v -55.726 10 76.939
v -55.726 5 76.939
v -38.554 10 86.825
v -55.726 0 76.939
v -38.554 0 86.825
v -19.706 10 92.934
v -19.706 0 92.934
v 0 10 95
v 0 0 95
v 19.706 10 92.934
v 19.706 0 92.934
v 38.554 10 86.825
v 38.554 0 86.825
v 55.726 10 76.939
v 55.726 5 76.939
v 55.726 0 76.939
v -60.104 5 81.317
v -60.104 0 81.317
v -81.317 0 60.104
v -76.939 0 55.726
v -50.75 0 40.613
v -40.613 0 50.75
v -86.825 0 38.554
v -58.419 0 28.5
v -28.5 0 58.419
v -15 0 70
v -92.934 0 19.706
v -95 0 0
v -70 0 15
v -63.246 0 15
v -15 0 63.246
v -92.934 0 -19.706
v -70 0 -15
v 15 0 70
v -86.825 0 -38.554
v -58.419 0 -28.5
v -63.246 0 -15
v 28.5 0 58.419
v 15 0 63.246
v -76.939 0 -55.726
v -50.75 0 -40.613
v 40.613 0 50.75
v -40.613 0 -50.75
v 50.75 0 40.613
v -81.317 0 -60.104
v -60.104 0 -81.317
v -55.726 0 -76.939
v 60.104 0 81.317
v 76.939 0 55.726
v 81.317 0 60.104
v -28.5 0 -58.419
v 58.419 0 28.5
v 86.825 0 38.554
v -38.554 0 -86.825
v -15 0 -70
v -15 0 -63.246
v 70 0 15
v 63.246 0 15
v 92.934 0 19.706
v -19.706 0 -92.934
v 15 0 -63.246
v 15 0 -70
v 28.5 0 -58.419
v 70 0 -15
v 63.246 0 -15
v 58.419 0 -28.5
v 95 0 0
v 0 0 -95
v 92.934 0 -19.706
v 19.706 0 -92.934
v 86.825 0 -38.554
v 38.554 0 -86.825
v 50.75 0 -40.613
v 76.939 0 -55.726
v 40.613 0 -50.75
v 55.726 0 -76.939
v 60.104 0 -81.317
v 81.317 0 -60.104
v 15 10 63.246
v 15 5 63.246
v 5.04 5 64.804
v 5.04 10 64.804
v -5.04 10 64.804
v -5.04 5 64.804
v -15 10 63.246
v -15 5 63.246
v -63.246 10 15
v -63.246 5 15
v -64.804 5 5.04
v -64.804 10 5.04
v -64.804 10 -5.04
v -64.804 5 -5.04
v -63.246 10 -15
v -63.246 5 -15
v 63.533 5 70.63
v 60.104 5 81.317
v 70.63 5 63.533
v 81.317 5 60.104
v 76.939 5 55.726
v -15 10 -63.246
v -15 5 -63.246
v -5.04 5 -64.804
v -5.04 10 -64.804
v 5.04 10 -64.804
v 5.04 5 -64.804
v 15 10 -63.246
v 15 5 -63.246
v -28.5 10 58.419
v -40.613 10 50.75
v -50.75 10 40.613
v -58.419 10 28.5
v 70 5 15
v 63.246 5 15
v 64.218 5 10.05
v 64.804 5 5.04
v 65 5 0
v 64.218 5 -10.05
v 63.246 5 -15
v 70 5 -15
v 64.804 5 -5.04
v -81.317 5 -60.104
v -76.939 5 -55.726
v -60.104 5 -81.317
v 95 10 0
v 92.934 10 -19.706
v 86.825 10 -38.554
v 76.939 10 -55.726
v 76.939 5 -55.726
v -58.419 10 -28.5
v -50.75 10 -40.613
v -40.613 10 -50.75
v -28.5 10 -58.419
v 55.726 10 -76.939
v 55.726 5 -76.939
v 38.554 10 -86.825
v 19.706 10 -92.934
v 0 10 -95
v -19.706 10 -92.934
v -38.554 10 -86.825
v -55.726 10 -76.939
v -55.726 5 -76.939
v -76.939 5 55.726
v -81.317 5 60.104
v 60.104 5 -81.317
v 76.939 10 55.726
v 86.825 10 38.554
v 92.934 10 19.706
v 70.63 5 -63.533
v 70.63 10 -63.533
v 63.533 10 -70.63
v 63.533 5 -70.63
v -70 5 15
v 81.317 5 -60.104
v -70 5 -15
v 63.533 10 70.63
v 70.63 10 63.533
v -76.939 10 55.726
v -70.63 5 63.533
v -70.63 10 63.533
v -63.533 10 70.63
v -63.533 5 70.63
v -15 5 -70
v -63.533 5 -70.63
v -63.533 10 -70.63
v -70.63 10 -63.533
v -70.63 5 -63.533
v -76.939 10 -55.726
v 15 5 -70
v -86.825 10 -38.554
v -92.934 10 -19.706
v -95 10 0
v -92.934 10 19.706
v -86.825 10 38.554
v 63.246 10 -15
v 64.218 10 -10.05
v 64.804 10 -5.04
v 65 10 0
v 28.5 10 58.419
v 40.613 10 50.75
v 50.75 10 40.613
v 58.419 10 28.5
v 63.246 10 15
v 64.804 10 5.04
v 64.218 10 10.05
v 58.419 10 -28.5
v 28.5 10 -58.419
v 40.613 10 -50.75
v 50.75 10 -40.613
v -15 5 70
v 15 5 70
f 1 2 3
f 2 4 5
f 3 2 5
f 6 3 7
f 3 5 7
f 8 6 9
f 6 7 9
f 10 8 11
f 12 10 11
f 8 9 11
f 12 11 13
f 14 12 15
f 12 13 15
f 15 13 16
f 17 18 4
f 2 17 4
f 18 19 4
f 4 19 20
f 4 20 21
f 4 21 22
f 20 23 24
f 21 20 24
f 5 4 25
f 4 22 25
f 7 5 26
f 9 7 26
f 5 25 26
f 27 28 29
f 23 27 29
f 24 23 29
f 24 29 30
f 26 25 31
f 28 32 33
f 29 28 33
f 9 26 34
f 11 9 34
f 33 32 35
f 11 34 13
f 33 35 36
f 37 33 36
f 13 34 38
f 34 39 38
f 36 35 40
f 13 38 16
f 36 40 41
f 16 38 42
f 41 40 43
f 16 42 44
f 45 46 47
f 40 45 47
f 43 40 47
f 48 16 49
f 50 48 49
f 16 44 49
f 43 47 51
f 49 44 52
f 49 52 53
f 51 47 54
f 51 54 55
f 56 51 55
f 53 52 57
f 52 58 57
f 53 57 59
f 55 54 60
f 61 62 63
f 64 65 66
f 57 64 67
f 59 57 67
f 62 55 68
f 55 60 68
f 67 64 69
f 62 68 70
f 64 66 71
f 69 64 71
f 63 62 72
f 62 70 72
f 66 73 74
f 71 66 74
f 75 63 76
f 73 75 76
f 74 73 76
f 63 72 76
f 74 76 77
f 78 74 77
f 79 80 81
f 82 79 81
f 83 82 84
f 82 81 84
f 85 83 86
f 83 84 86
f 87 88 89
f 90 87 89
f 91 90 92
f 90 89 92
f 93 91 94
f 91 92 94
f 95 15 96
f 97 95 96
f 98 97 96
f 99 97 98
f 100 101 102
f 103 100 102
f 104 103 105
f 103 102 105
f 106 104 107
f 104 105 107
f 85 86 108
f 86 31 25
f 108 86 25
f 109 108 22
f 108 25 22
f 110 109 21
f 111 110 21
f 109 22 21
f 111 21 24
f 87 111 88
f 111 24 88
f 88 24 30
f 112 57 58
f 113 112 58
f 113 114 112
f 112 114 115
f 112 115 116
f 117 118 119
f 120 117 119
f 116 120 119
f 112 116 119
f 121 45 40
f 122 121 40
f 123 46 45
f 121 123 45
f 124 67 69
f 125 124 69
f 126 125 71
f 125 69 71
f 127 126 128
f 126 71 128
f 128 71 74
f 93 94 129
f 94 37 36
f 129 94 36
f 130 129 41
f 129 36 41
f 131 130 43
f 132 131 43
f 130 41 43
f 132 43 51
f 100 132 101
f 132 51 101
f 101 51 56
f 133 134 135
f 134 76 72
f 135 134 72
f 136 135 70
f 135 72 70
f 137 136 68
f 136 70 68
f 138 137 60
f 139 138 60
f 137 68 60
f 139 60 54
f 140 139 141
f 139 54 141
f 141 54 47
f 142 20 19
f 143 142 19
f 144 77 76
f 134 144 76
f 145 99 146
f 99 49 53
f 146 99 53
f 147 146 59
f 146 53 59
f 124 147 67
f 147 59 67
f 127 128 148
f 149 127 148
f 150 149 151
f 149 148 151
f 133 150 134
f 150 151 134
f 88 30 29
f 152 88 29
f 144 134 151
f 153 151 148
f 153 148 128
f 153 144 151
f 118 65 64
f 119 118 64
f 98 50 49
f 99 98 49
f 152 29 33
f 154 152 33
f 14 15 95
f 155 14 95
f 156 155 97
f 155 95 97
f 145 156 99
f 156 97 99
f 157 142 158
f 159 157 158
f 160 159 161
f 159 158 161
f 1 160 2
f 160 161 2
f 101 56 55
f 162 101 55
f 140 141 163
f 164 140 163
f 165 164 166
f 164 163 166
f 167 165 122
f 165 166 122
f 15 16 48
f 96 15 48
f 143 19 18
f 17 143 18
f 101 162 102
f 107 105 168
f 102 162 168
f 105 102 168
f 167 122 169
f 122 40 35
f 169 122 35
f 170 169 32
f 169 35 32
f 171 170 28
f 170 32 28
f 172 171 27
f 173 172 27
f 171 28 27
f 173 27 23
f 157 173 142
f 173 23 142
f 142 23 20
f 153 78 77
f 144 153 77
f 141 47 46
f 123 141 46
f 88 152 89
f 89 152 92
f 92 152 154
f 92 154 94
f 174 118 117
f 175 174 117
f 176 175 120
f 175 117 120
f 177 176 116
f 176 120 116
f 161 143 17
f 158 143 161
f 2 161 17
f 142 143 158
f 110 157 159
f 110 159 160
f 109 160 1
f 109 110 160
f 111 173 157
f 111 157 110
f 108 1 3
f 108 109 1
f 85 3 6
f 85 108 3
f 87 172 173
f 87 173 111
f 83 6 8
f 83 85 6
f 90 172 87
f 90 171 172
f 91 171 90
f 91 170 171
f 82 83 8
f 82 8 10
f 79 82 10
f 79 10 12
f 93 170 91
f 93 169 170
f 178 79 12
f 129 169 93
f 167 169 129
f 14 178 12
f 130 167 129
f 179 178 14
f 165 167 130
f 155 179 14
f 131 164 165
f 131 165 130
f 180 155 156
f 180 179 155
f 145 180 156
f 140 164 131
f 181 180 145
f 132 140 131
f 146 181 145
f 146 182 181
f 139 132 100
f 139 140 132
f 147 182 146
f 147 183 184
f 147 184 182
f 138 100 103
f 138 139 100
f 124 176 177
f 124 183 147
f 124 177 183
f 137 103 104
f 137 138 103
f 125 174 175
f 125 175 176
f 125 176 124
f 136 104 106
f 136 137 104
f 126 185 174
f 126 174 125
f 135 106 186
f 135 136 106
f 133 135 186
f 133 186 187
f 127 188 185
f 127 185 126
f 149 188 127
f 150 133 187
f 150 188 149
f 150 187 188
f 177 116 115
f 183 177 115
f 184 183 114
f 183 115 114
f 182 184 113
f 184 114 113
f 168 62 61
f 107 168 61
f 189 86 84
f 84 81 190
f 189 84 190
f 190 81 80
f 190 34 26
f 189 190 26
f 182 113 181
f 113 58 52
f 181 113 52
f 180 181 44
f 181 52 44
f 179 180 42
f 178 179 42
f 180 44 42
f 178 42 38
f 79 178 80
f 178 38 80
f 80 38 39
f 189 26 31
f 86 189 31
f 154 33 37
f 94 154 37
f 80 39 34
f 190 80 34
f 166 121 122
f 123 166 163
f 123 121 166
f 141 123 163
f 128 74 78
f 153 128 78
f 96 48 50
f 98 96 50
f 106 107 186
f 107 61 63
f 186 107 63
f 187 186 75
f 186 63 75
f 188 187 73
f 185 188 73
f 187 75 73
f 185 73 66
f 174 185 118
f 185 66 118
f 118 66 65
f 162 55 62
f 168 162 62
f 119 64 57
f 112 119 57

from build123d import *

# Parameters (mm, degrees)
BOSS_EXTRUDE1_DEPTH = 10
BOSS_EXTRUDE2_DEPTH = 5
BOSS_EXTRUDE3_START = 5
BOSS_EXTRUDE3_DEPTH = 5


with BuildPart() as part:
    # Sketch1 → Boss-Extrude1 (new body)
    with BuildSketch(Plane(origin=(0, 0, 0), x_dir=(1, 0, 0), z_dir=(0, 1, 0))):
        with BuildLine():
            ThreePointArc((76.939097525, 55.725894089), (67.175144213, 67.175144213), (55.725894089, 76.939097525))
            ThreePointArc((55.725894089, 76.939097525), (0, 95), (-55.725894089, 76.939097525))
            ThreePointArc((-55.725894089, 76.939097525), (-67.175144213, 67.175144213), (-76.939097525, 55.725894089))
            ThreePointArc((-76.939097525, 55.725894089), (-95, 0), (-76.939097525, -55.725894089))
            ThreePointArc((-76.939097525, -55.725894089), (-67.175144213, -67.175144213), (-55.725894089, -76.939097525))
            ThreePointArc((-55.725894089, -76.939097525), (0, -95), (55.725894089, -76.939097525))
            ThreePointArc((55.725894089, -76.939097525), (67.175144213, -67.175144213), (76.939097525, -55.725894089))
            ThreePointArc((76.939097525, -55.725894089), (90.372048402, -29.289808254), (95, 0))
            ThreePointArc((95, 0), (90.372048402, 29.289808254), (76.939097525, 55.725894089))
        make_face()
        with BuildLine():
            Line((-63.245553203, -15), (-70, -15))
            Line((-70, -15), (-70, 15))
            Line((-70, 15), (-63.245553203, 15))
            ThreePointArc((-63.245553203, 15), (-45.961940777, 45.961940777), (-15, 63.245553203))
            Line((-15, 63.245553203), (-15, 70))
            Line((-15, 70), (15, 70))
            Line((15, 70), (15, 63.245553203))
            ThreePointArc((15, 63.245553203), (45.961940777, 45.961940777), (63.245553203, 15))
            Line((63.245553203, 15), (70, 15))
            Line((70, 15), (70, -15))
            Line((70, -15), (63.245553203, -15))
            ThreePointArc((63.245553203, -15), (45.961940777, -45.961940777), (15, -63.245553203))
            Line((15, -63.245553203), (15, -70))
            Line((15, -70), (-15, -70))
            Line((-15, -70), (-15, -63.245553203))
            ThreePointArc((-15, -63.245553203), (-45.961940777, -45.961940777), (-63.245553203, -15))
        make_face(mode=Mode.SUBTRACT)
    extrude(amount=BOSS_EXTRUDE1_DEPTH)

    # Sketch1<3> → Boss-Extrude2 (add)
    with BuildSketch(Plane(origin=(0, 0, 0), x_dir=(1, 0, 0), z_dir=(0, 1, 0))):
        with BuildLine():
            Line((81.317279836, 60.104076401), (60.104076401, 81.317279836))
            Line((60.104076401, 81.317279836), (55.725894089, 76.939097525))
            ThreePointArc((55.725894089, 76.939097525), (67.175144213, 67.175144213), (76.939097525, 55.725894089))
            Line((76.939097525, 55.725894089), (81.317279836, 60.104076401))
        make_face()
        with BuildLine():
            ThreePointArc((-76.939097525, 55.725894089), (-67.175144213, 67.175144213), (-55.725894089, 76.939097525))
            Line((-55.725894089, 76.939097525), (-60.104076401, 81.317279836))
            Line((-60.104076401, 81.317279836), (-81.317279836, 60.104076401))
            Line((-81.317279836, 60.104076401), (-76.939097525, 55.725894089))
        make_face()
        with BuildLine():
            Line((81.317279836, -60.104076401), (76.939097525, -55.725894089))
            ThreePointArc((76.939097525, -55.725894089), (67.175144213, -67.175144213), (55.725894089, -76.939097525))
            Line((55.725894089, -76.939097525), (60.104076401, -81.317279836))
            Line((60.104076401, -81.317279836), (81.317279836, -60.104076401))
        make_face()
        with BuildLine():
            ThreePointArc((-55.725894089, -76.939097525), (-67.175144213, -67.175144213), (-76.939097525, -55.725894089))
            Line((-76.939097525, -55.725894089), (-81.317279836, -60.104076401))
            Line((-81.317279836, -60.104076401), (-60.104076401, -81.317279836))
            Line((-60.104076401, -81.317279836), (-55.725894089, -76.939097525))
        make_face()
    extrude(amount=BOSS_EXTRUDE2_DEPTH)

    # Sketch1<4> → Boss-Extrude3 (add)
    with BuildSketch(Plane(origin=(0, 0, 0), x_dir=(1, 0, 0), z_dir=(0, 1, 0)).offset(BOSS_EXTRUDE3_START)):
        with BuildLine():
            Line((-70, 15), (-70, -15))
            Line((-70, -15), (-63.245553203, -15))
            ThreePointArc((-63.245553203, -15), (-65, 0), (-63.245553203, 15))
            Line((-63.245553203, 15), (-70, 15))
        make_face()
        with BuildLine():
            ThreePointArc((15, -63.245553203), (0, -65), (-15, -63.245553203))
            Line((-15, -63.245553203), (-15, -70))
            Line((-15, -70), (15, -70))
            Line((15, -70), (15, -63.245553203))
        make_face()
        with BuildLine():
            Line((-15, 70), (-15, 63.245553203))
            ThreePointArc((-15, 63.245553203), (0, 65), (15, 63.245553203))
            Line((15, 63.245553203), (15, 70))
            Line((15, 70), (-15, 70))
        make_face()
        with BuildLine():
            ThreePointArc((63.245553203, 15), (65, 0), (63.245553203, -15))
            Line((63.245553203, -15), (70, -15))
            Line((70, -15), (70, 15))
            Line((70, 15), (63.245553203, 15))
        make_face()
    extrude(amount=BOSS_EXTRUDE3_DEPTH)


solid = part.part
